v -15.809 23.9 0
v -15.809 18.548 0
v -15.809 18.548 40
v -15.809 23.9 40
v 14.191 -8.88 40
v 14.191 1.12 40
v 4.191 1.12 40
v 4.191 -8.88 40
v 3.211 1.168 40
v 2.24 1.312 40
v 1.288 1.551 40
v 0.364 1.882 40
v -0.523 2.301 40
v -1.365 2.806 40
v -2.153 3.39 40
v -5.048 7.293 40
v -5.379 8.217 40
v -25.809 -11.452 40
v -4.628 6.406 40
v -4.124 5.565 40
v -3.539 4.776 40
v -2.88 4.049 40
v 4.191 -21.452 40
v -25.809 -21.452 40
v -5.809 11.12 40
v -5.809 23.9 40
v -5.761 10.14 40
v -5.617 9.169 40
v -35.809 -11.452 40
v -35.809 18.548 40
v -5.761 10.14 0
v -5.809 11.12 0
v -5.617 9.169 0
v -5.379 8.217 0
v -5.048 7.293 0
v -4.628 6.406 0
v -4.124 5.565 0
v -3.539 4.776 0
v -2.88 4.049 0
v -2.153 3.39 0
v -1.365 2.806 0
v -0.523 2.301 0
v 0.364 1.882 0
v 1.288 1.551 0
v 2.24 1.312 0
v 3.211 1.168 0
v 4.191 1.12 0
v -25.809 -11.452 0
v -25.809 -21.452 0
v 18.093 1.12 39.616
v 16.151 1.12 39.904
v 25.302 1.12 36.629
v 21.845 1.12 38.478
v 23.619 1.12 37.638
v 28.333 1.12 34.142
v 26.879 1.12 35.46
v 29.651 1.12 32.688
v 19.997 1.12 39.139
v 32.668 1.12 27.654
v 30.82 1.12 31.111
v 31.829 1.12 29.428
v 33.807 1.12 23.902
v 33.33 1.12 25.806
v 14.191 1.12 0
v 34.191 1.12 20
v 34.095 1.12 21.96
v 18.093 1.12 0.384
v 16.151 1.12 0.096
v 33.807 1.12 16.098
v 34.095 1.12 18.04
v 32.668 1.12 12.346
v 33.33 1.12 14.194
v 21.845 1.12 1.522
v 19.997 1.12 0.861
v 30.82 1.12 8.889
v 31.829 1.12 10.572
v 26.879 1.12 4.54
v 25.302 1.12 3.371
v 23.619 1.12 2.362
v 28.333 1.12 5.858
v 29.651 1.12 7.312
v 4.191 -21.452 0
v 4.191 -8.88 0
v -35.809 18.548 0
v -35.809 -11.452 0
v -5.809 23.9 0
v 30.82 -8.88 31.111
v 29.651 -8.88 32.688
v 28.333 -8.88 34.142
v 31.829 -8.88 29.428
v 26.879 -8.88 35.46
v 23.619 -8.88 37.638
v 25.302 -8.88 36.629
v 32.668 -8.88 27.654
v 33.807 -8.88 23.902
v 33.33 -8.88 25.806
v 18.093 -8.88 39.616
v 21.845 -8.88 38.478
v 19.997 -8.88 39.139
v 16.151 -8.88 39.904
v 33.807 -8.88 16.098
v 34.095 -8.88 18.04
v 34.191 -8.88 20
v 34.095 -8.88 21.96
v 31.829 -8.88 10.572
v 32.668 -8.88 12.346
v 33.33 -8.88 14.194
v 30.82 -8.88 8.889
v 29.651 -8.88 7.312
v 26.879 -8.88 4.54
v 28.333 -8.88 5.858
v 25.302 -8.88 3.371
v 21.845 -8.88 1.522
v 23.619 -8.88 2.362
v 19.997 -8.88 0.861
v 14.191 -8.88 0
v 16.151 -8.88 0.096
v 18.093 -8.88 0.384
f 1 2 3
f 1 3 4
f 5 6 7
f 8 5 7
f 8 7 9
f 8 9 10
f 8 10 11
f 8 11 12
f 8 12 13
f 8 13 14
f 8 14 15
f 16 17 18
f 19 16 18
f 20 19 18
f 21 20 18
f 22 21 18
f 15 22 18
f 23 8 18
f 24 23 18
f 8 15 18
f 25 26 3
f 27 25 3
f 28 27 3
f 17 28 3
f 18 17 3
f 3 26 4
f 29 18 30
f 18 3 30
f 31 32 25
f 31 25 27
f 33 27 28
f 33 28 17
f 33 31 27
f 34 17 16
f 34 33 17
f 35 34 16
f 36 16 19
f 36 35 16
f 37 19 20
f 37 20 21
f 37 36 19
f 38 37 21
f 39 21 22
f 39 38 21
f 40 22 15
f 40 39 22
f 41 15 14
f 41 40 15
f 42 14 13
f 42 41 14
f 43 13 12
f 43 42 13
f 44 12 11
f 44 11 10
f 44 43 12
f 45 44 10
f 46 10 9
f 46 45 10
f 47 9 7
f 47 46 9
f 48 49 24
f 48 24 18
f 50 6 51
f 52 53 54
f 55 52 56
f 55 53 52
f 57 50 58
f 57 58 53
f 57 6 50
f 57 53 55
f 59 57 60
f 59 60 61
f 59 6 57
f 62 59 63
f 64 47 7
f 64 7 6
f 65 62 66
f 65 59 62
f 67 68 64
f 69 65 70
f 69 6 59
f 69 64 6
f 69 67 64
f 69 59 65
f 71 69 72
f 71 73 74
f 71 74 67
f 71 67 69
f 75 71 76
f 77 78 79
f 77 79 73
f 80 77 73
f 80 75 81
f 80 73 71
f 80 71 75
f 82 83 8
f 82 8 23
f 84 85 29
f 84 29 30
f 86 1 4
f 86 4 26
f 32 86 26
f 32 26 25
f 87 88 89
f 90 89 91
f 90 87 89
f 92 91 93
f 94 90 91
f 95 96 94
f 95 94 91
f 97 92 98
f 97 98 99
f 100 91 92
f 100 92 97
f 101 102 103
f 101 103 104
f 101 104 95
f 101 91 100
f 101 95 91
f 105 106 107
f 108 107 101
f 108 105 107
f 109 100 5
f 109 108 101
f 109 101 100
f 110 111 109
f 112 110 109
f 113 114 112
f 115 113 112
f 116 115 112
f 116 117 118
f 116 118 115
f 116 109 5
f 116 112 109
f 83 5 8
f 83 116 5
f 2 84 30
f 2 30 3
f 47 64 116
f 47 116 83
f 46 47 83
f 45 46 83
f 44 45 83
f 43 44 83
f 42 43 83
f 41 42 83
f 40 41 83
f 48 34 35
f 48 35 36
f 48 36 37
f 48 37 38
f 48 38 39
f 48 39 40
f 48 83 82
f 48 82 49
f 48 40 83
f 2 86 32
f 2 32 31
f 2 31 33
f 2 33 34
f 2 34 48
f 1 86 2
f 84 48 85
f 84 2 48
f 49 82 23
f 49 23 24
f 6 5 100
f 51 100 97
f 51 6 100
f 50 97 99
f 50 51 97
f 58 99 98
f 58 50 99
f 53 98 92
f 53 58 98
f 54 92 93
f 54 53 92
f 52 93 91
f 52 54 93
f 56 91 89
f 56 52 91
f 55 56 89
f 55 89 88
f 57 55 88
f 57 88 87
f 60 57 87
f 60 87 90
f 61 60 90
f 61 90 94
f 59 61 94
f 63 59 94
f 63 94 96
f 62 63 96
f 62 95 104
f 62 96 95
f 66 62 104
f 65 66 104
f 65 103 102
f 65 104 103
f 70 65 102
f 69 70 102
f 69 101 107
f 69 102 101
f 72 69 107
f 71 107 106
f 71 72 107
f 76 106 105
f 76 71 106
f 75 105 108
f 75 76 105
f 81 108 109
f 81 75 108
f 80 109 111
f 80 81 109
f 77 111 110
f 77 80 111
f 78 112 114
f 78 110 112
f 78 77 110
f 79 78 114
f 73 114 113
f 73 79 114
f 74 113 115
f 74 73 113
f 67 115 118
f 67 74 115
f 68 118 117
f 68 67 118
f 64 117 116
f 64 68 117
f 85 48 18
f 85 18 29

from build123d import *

# Parameters (mm, degrees)
BOSS_EXTRUDE1_DEPTH = 40
SKETCH3_OUTSIDE_W   = 90.5
SKETCH3_OUTSIDE_H   = 60.5
CUT_EXTRUDE1_DEPTH  = 40


with BuildPart() as part:
    # Sketch1 → Boss-Extrude1 (new body)
    with BuildSketch(Plane.XY):
        with BuildLine():
            Line((-15.809128631, 23.900414938), (-5.809128631, 23.900414938))
            Line((-5.809128631, 23.900414938), (-5.809128631, 11.12033195))
            ThreePointArc((-5.809128631, 11.12033195), (-2.880196443, 4.049264138), (4.190871369, 1.12033195))
            Line((4.190871369, 1.12033195), (34.190871369, 1.12033195))
            Line((34.190871369, 1.12033195), (34.190871369, -8.87966805))
            Line((34.190871369, -8.87966805), (4.190871369, -8.87966805))
            Line((4.190871369, -8.87966805), (4.190871369, -21.452282158))
            Line((4.190871369, -21.452282158), (-25.809128631, -21.452282158))
            Line((-25.809128631, -21.452282158), (-25.809128631, -11.452282158))
            Line((-25.809128631, -11.452282158), (-35.809128631, -11.452282158))
            Line((-35.809128631, -11.452282158), (-35.809128631, 18.547717842))
            Line((-35.809128631, 18.547717842), (-15.809128631, 18.547717842))
            Line((-15.809128631, 18.547717842), (-15.809128631, 23.900414938))
        make_face()
    extrude(amount=BOSS_EXTRUDE1_DEPTH)

    # Sketch3 outside → Cut-Extrude1 (cut)
    with BuildSketch(Plane(origin=(0, 1.12033195, 0), x_dir=(1, 0, 0), z_dir=(0, 1, 0))):
        with Locations((-0.809, -20)):
            Rectangle(SKETCH3_OUTSIDE_W, SKETCH3_OUTSIDE_H)
        with BuildLine():
            Line((14.190871369, 0), (-35.809128631, 0))
            Line((-35.809128631, 0), (-35.809128631, -40))
            Line((-35.809128631, -40), (14.190871369, -40))
            ThreePointArc((14.190871369, -40), (34.190871369, -20), (14.190871369, 0))
        make_face(mode=Mode.SUBTRACT)
    extrude(amount=-CUT_EXTRUDE1_DEPTH, mode=Mode.SUBTRACT)


solid = part.part
